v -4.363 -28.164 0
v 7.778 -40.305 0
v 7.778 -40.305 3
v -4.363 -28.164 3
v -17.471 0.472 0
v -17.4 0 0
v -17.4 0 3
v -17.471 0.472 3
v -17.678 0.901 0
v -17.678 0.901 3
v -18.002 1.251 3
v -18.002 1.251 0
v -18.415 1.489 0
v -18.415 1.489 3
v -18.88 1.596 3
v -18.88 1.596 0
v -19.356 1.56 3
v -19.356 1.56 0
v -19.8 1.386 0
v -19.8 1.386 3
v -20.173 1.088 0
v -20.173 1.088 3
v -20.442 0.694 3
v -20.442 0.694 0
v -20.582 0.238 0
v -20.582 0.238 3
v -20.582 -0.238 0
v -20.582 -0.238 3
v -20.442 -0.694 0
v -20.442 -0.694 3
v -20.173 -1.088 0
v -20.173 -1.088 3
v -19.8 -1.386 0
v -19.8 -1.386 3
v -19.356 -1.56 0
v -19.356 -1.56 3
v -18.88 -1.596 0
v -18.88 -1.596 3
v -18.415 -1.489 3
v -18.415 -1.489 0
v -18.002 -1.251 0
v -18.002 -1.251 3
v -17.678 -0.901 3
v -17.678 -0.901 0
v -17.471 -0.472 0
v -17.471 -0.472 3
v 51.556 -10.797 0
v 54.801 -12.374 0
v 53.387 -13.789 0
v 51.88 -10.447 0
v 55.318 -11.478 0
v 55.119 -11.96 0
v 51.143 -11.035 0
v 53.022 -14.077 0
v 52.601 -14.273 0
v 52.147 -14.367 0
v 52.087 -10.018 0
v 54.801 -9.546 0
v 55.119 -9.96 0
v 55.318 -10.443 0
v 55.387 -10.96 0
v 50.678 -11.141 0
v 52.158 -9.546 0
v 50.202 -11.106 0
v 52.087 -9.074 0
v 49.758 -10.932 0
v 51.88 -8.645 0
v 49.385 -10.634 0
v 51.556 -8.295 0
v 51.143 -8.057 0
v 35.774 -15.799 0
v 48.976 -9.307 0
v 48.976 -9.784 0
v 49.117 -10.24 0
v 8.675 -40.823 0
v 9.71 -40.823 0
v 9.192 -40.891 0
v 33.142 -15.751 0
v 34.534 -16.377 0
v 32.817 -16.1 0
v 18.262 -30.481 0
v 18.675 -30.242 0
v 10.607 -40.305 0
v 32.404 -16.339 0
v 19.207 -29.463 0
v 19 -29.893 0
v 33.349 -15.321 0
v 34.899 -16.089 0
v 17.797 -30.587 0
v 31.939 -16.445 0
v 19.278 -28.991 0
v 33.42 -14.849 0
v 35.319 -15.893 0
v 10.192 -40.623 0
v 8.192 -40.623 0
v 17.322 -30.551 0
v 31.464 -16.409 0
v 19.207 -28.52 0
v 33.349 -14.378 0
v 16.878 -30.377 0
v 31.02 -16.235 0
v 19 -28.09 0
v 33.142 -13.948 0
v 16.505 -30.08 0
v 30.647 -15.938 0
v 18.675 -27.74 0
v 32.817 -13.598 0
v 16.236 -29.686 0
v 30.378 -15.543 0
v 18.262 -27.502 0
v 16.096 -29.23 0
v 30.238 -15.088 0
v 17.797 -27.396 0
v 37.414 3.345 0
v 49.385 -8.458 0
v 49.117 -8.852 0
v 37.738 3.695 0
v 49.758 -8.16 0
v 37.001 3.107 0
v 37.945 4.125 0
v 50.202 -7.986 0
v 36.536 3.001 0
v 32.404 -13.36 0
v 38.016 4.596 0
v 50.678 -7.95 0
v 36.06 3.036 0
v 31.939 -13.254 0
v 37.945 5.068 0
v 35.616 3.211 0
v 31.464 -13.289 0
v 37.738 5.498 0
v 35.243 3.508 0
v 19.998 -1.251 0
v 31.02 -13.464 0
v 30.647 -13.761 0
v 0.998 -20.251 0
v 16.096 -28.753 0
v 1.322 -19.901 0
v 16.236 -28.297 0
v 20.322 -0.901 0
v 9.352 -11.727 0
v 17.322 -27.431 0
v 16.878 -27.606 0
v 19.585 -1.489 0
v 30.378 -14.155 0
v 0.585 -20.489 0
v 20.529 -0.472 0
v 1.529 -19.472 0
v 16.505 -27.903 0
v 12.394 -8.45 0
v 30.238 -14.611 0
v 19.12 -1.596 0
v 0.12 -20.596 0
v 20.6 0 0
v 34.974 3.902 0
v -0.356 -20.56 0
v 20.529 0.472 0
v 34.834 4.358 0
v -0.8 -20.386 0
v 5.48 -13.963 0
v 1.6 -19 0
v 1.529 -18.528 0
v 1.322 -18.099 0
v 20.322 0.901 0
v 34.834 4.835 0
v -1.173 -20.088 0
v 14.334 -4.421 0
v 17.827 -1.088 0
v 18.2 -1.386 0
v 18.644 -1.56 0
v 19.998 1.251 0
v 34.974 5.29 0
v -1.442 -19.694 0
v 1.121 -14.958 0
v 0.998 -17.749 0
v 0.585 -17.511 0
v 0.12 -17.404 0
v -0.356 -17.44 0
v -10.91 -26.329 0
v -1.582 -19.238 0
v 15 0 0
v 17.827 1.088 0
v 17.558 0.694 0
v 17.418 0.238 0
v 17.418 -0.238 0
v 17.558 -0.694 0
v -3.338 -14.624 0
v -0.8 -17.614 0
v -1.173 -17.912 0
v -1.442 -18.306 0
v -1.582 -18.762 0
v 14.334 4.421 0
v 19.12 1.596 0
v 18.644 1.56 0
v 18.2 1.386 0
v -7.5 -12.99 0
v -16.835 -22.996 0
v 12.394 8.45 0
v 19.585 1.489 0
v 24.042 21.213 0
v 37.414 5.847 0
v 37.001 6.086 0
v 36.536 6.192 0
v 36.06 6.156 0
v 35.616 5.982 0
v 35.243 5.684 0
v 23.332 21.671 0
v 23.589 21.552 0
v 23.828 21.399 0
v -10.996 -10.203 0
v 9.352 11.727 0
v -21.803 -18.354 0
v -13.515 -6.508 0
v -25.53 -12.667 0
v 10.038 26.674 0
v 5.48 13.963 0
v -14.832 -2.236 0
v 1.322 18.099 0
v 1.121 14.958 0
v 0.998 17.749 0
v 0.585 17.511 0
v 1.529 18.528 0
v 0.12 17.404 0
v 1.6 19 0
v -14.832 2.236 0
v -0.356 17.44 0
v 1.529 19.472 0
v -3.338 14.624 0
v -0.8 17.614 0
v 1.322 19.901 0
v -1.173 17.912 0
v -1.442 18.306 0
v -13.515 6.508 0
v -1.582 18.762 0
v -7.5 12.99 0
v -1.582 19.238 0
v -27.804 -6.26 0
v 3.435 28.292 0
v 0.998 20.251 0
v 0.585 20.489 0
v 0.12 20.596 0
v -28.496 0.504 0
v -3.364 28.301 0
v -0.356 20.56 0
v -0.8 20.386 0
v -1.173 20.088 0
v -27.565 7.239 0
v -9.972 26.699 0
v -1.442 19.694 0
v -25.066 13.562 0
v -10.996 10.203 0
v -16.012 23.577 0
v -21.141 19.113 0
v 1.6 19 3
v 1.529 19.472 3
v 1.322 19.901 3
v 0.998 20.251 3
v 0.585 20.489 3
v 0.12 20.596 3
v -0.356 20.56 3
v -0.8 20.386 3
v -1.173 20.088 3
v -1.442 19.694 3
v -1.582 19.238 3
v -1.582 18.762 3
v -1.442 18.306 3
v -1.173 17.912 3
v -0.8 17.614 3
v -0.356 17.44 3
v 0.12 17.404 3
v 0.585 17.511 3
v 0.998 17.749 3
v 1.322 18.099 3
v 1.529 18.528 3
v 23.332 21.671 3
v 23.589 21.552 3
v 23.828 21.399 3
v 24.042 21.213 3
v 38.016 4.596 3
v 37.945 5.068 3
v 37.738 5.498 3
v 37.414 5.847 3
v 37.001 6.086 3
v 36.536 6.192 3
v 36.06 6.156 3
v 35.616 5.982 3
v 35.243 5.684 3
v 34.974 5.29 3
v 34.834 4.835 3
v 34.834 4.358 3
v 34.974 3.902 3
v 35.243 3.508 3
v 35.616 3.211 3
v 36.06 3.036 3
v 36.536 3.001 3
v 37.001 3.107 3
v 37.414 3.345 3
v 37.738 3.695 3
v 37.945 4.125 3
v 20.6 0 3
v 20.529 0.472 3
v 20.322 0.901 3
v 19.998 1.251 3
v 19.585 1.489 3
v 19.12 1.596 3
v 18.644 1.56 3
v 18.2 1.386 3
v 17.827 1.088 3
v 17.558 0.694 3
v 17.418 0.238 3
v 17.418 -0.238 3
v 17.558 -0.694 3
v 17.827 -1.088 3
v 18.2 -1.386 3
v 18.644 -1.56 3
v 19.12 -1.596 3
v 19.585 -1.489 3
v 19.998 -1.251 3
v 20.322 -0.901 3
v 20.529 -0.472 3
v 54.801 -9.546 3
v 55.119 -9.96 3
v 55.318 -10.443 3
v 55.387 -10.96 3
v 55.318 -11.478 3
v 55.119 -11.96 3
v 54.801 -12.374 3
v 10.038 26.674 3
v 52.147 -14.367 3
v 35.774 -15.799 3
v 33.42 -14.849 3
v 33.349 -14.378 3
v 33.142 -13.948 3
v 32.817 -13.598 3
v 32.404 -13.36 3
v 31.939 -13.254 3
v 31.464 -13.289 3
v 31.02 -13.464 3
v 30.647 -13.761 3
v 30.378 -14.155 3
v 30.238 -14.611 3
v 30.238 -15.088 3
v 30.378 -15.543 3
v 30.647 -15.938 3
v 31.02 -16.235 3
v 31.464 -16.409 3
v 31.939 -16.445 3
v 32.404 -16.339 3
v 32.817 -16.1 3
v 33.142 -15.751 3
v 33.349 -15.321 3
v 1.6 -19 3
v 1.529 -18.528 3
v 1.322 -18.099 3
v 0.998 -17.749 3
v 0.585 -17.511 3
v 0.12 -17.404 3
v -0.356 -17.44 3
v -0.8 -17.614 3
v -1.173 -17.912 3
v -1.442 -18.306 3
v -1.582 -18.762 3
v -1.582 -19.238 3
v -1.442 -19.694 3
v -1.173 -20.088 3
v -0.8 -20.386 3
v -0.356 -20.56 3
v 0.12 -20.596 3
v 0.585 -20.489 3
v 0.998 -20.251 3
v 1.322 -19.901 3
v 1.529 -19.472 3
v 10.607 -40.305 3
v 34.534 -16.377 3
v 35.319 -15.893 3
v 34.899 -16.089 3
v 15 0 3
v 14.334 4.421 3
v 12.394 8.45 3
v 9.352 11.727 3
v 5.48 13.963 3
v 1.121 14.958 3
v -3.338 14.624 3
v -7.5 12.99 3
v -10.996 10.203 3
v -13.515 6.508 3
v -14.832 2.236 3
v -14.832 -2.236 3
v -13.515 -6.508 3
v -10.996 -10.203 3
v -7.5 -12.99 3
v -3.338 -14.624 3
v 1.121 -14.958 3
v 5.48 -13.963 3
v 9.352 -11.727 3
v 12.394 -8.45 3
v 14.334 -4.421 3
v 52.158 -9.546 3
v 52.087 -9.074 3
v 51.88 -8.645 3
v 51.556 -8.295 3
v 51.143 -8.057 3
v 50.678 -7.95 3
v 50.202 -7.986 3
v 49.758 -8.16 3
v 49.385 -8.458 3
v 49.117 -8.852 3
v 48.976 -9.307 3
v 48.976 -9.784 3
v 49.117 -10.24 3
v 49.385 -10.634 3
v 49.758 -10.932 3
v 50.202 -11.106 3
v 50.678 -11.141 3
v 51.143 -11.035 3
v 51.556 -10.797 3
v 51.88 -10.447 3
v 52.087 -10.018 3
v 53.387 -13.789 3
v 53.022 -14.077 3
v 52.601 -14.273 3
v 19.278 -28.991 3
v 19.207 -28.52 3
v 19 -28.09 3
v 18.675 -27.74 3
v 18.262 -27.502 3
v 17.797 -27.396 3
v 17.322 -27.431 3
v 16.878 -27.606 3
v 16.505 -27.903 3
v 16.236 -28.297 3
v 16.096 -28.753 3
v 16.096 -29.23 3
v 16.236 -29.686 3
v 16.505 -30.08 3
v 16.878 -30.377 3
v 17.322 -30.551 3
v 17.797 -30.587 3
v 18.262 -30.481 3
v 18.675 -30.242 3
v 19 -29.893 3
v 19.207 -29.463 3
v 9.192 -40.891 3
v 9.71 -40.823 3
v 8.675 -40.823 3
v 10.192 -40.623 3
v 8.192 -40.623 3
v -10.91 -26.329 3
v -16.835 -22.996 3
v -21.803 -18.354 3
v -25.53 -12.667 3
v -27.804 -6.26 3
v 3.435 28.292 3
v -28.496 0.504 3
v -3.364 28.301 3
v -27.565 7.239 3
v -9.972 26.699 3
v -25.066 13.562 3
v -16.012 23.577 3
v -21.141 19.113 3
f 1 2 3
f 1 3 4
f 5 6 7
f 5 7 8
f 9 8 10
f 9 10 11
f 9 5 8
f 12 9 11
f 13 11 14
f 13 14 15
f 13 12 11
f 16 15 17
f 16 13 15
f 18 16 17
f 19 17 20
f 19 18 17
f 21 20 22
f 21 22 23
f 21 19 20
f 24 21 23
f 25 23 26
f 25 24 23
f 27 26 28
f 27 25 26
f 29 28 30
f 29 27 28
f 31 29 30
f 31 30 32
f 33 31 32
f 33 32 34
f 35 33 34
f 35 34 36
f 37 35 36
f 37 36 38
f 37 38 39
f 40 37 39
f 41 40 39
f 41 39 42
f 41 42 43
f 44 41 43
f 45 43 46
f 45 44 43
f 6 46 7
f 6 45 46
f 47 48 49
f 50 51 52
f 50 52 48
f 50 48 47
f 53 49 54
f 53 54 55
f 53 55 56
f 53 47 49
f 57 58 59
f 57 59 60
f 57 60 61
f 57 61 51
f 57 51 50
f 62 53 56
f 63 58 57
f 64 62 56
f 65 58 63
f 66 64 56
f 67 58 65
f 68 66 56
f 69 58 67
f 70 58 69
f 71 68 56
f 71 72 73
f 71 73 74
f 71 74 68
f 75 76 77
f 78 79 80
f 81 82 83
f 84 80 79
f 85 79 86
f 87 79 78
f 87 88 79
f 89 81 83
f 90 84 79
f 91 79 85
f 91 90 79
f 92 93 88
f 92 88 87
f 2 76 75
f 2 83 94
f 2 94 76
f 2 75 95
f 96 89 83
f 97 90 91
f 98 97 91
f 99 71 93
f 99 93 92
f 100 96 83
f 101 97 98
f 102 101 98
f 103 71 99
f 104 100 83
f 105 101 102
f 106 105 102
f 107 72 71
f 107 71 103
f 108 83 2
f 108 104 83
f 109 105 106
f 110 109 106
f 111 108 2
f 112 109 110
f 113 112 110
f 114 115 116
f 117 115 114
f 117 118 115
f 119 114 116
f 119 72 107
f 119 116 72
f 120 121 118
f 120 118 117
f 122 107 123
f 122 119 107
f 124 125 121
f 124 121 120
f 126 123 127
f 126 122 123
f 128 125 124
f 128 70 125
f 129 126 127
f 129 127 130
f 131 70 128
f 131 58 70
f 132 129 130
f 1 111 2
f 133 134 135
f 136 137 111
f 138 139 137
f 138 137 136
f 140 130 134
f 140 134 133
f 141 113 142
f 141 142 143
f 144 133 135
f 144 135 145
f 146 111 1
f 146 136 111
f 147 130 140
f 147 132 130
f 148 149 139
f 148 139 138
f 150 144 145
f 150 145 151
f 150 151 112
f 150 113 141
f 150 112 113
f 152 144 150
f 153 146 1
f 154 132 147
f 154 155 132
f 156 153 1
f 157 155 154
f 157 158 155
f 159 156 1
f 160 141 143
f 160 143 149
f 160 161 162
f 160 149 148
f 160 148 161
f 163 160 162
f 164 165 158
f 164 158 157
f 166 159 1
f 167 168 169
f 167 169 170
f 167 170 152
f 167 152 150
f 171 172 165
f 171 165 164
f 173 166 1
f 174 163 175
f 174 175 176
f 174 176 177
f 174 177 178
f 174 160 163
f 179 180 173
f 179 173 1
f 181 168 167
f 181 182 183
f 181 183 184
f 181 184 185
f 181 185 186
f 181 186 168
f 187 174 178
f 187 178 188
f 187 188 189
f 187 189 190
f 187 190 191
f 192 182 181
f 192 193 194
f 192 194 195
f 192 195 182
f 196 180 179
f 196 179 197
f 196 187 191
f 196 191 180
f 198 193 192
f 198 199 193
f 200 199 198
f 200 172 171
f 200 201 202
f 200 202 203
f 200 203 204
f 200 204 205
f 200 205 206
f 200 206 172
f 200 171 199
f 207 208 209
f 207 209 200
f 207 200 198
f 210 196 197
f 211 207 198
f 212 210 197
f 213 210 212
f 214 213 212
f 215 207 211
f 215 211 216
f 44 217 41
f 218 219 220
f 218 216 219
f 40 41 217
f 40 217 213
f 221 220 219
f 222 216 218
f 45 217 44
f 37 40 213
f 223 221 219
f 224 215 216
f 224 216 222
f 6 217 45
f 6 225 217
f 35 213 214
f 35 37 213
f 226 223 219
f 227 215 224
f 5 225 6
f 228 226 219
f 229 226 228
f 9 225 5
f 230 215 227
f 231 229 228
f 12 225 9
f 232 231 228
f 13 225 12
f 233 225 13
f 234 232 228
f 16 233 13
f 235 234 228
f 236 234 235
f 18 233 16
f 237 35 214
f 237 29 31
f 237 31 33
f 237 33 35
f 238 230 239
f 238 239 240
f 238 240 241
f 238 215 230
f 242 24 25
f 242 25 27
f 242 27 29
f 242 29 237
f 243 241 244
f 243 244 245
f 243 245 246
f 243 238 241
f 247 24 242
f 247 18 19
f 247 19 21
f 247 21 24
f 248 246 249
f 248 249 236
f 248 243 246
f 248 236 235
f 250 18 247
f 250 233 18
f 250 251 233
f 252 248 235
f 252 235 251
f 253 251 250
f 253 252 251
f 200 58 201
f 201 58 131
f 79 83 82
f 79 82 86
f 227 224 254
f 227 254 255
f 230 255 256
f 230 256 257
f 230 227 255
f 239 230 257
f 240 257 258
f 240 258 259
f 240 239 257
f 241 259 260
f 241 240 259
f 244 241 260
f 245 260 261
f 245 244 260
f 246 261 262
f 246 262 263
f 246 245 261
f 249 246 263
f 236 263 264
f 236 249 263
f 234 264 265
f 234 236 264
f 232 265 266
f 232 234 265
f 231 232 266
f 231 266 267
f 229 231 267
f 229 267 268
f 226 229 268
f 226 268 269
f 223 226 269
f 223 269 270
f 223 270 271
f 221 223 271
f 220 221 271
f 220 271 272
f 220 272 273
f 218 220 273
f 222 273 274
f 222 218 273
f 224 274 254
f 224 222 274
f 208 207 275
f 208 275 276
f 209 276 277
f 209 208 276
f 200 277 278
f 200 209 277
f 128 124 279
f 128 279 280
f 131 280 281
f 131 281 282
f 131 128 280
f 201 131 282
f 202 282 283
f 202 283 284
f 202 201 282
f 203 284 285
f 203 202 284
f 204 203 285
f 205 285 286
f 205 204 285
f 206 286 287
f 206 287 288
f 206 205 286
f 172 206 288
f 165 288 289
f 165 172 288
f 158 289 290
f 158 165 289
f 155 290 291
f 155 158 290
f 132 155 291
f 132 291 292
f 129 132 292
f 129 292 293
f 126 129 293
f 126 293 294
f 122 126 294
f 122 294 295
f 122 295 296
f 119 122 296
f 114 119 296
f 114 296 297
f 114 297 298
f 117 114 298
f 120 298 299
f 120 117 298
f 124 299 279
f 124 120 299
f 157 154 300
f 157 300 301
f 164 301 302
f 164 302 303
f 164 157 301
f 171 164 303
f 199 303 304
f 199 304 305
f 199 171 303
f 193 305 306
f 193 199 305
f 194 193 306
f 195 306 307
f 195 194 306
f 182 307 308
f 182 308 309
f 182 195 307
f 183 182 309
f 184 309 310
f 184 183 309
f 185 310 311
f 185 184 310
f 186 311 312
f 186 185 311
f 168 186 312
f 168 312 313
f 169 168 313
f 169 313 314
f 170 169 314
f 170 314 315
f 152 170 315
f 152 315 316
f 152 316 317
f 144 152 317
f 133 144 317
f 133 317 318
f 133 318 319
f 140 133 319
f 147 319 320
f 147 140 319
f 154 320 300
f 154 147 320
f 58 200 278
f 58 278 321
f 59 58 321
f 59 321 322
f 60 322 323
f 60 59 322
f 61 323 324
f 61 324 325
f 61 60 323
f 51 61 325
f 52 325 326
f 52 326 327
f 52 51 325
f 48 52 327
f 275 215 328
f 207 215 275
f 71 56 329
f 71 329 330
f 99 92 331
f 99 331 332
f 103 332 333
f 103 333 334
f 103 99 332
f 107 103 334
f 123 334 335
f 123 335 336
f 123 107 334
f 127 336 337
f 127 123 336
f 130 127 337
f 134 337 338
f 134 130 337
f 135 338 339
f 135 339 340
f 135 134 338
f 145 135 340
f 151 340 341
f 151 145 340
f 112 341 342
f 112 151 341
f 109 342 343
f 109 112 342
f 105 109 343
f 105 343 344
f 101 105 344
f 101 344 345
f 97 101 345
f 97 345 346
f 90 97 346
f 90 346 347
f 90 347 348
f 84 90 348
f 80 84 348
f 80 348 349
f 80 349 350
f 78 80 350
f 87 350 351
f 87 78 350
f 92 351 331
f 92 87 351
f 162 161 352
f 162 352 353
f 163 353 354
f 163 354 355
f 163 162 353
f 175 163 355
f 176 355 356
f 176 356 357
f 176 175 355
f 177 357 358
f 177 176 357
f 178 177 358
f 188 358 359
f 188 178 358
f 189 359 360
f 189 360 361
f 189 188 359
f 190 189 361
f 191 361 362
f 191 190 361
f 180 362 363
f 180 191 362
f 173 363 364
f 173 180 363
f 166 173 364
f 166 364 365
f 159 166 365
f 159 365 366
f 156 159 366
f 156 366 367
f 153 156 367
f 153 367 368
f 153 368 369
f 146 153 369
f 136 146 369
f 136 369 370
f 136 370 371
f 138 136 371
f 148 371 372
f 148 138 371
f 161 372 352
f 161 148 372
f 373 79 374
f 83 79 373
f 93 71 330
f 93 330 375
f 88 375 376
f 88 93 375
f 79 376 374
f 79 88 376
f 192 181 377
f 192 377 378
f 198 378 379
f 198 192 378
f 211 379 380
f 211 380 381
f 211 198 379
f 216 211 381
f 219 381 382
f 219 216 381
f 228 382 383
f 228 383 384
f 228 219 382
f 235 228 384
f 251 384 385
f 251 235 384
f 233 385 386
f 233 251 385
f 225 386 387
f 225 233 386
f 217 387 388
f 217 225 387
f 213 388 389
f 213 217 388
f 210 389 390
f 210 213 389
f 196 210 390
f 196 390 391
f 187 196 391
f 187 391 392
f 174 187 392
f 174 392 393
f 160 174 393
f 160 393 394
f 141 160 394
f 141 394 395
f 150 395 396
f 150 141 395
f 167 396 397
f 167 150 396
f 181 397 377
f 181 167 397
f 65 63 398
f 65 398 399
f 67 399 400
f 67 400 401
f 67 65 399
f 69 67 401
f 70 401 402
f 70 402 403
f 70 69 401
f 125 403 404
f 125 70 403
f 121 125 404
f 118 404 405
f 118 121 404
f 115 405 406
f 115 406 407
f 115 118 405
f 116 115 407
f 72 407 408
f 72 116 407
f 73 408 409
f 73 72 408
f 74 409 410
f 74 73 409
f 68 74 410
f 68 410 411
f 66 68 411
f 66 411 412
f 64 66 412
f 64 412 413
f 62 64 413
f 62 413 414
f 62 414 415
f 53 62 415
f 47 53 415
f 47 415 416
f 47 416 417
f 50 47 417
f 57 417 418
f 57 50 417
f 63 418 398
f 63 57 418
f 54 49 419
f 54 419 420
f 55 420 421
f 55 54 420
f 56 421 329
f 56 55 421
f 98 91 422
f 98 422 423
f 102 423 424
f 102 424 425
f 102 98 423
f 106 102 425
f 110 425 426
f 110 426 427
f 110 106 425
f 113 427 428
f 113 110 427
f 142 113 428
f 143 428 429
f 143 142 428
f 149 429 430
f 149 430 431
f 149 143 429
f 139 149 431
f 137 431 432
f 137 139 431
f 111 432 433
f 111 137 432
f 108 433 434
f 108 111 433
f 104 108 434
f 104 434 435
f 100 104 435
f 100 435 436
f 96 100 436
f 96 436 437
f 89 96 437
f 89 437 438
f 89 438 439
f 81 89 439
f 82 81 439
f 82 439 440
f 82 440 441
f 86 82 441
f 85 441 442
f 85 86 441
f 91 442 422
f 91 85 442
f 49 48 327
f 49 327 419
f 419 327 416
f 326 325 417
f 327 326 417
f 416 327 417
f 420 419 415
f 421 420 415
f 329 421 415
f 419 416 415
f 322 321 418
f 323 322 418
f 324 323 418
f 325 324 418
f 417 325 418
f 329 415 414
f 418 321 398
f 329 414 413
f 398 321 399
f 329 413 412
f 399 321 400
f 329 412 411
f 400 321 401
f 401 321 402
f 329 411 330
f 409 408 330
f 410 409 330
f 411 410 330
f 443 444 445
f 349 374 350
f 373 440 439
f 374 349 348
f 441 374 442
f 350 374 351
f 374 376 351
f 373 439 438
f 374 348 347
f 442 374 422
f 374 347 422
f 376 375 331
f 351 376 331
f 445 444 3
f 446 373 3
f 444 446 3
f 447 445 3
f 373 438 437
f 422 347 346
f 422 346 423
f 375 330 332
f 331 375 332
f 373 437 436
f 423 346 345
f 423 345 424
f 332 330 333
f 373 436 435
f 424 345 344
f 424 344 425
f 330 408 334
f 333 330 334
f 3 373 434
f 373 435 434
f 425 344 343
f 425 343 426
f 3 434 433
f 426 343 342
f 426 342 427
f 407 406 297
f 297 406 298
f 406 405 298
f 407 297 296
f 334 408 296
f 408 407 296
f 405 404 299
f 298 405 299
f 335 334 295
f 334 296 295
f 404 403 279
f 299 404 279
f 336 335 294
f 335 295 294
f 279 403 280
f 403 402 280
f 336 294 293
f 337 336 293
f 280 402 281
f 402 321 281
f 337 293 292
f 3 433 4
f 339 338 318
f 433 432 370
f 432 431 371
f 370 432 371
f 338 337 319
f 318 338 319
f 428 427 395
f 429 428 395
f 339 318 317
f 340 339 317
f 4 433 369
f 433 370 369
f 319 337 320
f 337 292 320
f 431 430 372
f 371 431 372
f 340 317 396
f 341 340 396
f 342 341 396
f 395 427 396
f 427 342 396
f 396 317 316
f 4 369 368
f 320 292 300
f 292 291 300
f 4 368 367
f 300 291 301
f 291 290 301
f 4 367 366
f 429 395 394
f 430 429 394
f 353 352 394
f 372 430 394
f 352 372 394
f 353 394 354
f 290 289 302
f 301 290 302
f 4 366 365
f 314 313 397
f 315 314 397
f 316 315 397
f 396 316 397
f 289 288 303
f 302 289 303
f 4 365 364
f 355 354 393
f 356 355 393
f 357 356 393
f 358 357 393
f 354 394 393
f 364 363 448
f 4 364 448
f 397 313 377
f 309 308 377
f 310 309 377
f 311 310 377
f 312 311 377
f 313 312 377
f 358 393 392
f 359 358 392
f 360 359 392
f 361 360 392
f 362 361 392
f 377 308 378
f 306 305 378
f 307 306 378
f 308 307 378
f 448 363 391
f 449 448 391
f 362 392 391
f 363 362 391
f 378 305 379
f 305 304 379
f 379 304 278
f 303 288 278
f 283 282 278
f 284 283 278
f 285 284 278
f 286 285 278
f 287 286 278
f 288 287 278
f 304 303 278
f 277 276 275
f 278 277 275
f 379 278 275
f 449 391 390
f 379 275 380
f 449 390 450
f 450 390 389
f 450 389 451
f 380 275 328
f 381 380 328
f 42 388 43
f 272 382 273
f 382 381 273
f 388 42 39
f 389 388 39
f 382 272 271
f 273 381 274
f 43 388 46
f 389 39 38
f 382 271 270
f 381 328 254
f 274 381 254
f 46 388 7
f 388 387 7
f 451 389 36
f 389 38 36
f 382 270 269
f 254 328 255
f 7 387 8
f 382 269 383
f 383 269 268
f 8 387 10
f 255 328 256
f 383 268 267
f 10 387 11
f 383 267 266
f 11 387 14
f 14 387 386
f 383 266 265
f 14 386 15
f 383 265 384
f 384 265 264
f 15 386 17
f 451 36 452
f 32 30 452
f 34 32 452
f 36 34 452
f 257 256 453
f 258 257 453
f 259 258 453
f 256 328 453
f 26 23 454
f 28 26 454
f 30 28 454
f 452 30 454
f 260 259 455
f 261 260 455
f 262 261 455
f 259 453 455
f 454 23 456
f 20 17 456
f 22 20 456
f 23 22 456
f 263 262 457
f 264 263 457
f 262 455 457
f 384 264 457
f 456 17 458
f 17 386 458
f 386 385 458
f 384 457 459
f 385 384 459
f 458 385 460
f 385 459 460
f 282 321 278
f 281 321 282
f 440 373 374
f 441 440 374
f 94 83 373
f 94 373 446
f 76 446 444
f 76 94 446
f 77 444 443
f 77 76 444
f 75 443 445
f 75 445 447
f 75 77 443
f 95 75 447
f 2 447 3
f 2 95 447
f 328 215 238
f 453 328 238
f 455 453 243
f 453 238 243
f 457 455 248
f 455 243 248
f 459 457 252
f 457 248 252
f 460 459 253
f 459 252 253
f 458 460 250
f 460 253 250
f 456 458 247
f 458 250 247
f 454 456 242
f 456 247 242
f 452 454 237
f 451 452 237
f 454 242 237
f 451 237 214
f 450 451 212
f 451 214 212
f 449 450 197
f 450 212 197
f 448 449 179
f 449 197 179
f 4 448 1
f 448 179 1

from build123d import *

# Parameters (mm, degrees)
SKETCH_1_R      = 28.5
SKETCH_1_R_2    = 1.6
SKETCH_1_R_3    = 15
EXTRUDE_1_DEPTH = 3
EXTRUDE_START   = -3
SKETCH_2_R      = 1.6
EXTRUDE_2_DEPTH = 3
EXTRUDE_3_DEPTH = 3


with BuildPart() as part:
    # 草图1 → 凸台-拉伸1 (new body)
    with BuildSketch(Plane.XY):
        Circle(SKETCH_1_R)
        with Locations((0, 19)):
            Circle(SKETCH_1_R_2, mode=Mode.SUBTRACT)
        Circle(SKETCH_1_R_3, mode=Mode.SUBTRACT)
        with Locations((19, 0)):
            Circle(SKETCH_1_R_2, mode=Mode.SUBTRACT)
        with Locations((0, -19)):
            Circle(SKETCH_1_R_2, mode=Mode.SUBTRACT)
        with Locations((-19, 0)):
            Circle(SKETCH_1_R_2, mode=Mode.SUBTRACT)
    extrude(amount=EXTRUDE_1_DEPTH)

    # 草图2 → 凸台-拉伸2 (add)
    with BuildSketch(Plane.XY.offset(3).offset(EXTRUDE_START)):
        with BuildLine():
            Line((24.04163056, 21.213203436), (54.800775542, -9.545941546))
            ThreePointArc((54.800775542, -9.545941546), (55.38656198, -10.960155108), (54.800775542, -12.374368671))
            Line((54.800775542, -12.374368671), (53.38656198, -13.788582233))
            ThreePointArc((53.38656198, -13.788582233), (52.817584941, -14.186984245), (52.146659903, -14.366758067))
            Line((52.146659903, -14.366758067), (35.774256751, -15.799157737))
            ThreePointArc((35.774256751, -15.799157737), (35.103331713, -15.978931559), (34.534354674, -16.377333571))
            Line((34.534354674, -16.377333571), (10.606601718, -40.305086528))
            ThreePointArc((10.606601718, -40.305086528), (9.192388155, -40.890872965), (7.778174593, -40.305086528))
            Line((7.778174593, -40.305086528), (-4.362825732, -28.164086203))
            ThreePointArc((-4.362825732, -28.164086203), (25.415604767, -12.895620742), (20.152543264, 20.152543264))
            Line((20.152543264, 20.152543264), (21.213203436, 21.213203436))
            ThreePointArc((21.213203436, 21.213203436), (22.627416998, 21.798989873), (24.04163056, 21.213203436))
        make_face()
        with Locations((50.558134855, -9.545941546)):
            Circle(SKETCH_2_R, mode=Mode.SUBTRACT)
        with Locations((36.415999231, 4.596194078)):
            Circle(SKETCH_2_R, mode=Mode.SUBTRACT)
        with Locations((17.67766953, -28.991378029)):
            Circle(SKETCH_2_R, mode=Mode.SUBTRACT)
        with Locations((31.819805153, -14.849242405)):
            Circle(SKETCH_2_R, mode=Mode.SUBTRACT)
    extrude(amount=EXTRUDE_2_DEPTH)

    # 草图4 → 凸台-拉伸3 (add)
    with BuildSketch(Plane.XY.offset(3).offset(EXTRUDE_START)):
        with BuildLine():
            Line((10.038186091, 26.673672788), (23.33185111, 21.67082656))
            ThreePointArc((23.33185111, 21.67082656), (22.205159437, 21.753906381), (21.213203436, 21.213203436))
            Line((21.213203436, 21.213203436), (20.152543264, 20.152543264))
            ThreePointArc((20.152543264, 20.152543264), (15.443487861, 23.953051636), (10.038186091, 26.673672788))
        make_face()
    extrude(amount=EXTRUDE_3_DEPTH)


solid = part.part
